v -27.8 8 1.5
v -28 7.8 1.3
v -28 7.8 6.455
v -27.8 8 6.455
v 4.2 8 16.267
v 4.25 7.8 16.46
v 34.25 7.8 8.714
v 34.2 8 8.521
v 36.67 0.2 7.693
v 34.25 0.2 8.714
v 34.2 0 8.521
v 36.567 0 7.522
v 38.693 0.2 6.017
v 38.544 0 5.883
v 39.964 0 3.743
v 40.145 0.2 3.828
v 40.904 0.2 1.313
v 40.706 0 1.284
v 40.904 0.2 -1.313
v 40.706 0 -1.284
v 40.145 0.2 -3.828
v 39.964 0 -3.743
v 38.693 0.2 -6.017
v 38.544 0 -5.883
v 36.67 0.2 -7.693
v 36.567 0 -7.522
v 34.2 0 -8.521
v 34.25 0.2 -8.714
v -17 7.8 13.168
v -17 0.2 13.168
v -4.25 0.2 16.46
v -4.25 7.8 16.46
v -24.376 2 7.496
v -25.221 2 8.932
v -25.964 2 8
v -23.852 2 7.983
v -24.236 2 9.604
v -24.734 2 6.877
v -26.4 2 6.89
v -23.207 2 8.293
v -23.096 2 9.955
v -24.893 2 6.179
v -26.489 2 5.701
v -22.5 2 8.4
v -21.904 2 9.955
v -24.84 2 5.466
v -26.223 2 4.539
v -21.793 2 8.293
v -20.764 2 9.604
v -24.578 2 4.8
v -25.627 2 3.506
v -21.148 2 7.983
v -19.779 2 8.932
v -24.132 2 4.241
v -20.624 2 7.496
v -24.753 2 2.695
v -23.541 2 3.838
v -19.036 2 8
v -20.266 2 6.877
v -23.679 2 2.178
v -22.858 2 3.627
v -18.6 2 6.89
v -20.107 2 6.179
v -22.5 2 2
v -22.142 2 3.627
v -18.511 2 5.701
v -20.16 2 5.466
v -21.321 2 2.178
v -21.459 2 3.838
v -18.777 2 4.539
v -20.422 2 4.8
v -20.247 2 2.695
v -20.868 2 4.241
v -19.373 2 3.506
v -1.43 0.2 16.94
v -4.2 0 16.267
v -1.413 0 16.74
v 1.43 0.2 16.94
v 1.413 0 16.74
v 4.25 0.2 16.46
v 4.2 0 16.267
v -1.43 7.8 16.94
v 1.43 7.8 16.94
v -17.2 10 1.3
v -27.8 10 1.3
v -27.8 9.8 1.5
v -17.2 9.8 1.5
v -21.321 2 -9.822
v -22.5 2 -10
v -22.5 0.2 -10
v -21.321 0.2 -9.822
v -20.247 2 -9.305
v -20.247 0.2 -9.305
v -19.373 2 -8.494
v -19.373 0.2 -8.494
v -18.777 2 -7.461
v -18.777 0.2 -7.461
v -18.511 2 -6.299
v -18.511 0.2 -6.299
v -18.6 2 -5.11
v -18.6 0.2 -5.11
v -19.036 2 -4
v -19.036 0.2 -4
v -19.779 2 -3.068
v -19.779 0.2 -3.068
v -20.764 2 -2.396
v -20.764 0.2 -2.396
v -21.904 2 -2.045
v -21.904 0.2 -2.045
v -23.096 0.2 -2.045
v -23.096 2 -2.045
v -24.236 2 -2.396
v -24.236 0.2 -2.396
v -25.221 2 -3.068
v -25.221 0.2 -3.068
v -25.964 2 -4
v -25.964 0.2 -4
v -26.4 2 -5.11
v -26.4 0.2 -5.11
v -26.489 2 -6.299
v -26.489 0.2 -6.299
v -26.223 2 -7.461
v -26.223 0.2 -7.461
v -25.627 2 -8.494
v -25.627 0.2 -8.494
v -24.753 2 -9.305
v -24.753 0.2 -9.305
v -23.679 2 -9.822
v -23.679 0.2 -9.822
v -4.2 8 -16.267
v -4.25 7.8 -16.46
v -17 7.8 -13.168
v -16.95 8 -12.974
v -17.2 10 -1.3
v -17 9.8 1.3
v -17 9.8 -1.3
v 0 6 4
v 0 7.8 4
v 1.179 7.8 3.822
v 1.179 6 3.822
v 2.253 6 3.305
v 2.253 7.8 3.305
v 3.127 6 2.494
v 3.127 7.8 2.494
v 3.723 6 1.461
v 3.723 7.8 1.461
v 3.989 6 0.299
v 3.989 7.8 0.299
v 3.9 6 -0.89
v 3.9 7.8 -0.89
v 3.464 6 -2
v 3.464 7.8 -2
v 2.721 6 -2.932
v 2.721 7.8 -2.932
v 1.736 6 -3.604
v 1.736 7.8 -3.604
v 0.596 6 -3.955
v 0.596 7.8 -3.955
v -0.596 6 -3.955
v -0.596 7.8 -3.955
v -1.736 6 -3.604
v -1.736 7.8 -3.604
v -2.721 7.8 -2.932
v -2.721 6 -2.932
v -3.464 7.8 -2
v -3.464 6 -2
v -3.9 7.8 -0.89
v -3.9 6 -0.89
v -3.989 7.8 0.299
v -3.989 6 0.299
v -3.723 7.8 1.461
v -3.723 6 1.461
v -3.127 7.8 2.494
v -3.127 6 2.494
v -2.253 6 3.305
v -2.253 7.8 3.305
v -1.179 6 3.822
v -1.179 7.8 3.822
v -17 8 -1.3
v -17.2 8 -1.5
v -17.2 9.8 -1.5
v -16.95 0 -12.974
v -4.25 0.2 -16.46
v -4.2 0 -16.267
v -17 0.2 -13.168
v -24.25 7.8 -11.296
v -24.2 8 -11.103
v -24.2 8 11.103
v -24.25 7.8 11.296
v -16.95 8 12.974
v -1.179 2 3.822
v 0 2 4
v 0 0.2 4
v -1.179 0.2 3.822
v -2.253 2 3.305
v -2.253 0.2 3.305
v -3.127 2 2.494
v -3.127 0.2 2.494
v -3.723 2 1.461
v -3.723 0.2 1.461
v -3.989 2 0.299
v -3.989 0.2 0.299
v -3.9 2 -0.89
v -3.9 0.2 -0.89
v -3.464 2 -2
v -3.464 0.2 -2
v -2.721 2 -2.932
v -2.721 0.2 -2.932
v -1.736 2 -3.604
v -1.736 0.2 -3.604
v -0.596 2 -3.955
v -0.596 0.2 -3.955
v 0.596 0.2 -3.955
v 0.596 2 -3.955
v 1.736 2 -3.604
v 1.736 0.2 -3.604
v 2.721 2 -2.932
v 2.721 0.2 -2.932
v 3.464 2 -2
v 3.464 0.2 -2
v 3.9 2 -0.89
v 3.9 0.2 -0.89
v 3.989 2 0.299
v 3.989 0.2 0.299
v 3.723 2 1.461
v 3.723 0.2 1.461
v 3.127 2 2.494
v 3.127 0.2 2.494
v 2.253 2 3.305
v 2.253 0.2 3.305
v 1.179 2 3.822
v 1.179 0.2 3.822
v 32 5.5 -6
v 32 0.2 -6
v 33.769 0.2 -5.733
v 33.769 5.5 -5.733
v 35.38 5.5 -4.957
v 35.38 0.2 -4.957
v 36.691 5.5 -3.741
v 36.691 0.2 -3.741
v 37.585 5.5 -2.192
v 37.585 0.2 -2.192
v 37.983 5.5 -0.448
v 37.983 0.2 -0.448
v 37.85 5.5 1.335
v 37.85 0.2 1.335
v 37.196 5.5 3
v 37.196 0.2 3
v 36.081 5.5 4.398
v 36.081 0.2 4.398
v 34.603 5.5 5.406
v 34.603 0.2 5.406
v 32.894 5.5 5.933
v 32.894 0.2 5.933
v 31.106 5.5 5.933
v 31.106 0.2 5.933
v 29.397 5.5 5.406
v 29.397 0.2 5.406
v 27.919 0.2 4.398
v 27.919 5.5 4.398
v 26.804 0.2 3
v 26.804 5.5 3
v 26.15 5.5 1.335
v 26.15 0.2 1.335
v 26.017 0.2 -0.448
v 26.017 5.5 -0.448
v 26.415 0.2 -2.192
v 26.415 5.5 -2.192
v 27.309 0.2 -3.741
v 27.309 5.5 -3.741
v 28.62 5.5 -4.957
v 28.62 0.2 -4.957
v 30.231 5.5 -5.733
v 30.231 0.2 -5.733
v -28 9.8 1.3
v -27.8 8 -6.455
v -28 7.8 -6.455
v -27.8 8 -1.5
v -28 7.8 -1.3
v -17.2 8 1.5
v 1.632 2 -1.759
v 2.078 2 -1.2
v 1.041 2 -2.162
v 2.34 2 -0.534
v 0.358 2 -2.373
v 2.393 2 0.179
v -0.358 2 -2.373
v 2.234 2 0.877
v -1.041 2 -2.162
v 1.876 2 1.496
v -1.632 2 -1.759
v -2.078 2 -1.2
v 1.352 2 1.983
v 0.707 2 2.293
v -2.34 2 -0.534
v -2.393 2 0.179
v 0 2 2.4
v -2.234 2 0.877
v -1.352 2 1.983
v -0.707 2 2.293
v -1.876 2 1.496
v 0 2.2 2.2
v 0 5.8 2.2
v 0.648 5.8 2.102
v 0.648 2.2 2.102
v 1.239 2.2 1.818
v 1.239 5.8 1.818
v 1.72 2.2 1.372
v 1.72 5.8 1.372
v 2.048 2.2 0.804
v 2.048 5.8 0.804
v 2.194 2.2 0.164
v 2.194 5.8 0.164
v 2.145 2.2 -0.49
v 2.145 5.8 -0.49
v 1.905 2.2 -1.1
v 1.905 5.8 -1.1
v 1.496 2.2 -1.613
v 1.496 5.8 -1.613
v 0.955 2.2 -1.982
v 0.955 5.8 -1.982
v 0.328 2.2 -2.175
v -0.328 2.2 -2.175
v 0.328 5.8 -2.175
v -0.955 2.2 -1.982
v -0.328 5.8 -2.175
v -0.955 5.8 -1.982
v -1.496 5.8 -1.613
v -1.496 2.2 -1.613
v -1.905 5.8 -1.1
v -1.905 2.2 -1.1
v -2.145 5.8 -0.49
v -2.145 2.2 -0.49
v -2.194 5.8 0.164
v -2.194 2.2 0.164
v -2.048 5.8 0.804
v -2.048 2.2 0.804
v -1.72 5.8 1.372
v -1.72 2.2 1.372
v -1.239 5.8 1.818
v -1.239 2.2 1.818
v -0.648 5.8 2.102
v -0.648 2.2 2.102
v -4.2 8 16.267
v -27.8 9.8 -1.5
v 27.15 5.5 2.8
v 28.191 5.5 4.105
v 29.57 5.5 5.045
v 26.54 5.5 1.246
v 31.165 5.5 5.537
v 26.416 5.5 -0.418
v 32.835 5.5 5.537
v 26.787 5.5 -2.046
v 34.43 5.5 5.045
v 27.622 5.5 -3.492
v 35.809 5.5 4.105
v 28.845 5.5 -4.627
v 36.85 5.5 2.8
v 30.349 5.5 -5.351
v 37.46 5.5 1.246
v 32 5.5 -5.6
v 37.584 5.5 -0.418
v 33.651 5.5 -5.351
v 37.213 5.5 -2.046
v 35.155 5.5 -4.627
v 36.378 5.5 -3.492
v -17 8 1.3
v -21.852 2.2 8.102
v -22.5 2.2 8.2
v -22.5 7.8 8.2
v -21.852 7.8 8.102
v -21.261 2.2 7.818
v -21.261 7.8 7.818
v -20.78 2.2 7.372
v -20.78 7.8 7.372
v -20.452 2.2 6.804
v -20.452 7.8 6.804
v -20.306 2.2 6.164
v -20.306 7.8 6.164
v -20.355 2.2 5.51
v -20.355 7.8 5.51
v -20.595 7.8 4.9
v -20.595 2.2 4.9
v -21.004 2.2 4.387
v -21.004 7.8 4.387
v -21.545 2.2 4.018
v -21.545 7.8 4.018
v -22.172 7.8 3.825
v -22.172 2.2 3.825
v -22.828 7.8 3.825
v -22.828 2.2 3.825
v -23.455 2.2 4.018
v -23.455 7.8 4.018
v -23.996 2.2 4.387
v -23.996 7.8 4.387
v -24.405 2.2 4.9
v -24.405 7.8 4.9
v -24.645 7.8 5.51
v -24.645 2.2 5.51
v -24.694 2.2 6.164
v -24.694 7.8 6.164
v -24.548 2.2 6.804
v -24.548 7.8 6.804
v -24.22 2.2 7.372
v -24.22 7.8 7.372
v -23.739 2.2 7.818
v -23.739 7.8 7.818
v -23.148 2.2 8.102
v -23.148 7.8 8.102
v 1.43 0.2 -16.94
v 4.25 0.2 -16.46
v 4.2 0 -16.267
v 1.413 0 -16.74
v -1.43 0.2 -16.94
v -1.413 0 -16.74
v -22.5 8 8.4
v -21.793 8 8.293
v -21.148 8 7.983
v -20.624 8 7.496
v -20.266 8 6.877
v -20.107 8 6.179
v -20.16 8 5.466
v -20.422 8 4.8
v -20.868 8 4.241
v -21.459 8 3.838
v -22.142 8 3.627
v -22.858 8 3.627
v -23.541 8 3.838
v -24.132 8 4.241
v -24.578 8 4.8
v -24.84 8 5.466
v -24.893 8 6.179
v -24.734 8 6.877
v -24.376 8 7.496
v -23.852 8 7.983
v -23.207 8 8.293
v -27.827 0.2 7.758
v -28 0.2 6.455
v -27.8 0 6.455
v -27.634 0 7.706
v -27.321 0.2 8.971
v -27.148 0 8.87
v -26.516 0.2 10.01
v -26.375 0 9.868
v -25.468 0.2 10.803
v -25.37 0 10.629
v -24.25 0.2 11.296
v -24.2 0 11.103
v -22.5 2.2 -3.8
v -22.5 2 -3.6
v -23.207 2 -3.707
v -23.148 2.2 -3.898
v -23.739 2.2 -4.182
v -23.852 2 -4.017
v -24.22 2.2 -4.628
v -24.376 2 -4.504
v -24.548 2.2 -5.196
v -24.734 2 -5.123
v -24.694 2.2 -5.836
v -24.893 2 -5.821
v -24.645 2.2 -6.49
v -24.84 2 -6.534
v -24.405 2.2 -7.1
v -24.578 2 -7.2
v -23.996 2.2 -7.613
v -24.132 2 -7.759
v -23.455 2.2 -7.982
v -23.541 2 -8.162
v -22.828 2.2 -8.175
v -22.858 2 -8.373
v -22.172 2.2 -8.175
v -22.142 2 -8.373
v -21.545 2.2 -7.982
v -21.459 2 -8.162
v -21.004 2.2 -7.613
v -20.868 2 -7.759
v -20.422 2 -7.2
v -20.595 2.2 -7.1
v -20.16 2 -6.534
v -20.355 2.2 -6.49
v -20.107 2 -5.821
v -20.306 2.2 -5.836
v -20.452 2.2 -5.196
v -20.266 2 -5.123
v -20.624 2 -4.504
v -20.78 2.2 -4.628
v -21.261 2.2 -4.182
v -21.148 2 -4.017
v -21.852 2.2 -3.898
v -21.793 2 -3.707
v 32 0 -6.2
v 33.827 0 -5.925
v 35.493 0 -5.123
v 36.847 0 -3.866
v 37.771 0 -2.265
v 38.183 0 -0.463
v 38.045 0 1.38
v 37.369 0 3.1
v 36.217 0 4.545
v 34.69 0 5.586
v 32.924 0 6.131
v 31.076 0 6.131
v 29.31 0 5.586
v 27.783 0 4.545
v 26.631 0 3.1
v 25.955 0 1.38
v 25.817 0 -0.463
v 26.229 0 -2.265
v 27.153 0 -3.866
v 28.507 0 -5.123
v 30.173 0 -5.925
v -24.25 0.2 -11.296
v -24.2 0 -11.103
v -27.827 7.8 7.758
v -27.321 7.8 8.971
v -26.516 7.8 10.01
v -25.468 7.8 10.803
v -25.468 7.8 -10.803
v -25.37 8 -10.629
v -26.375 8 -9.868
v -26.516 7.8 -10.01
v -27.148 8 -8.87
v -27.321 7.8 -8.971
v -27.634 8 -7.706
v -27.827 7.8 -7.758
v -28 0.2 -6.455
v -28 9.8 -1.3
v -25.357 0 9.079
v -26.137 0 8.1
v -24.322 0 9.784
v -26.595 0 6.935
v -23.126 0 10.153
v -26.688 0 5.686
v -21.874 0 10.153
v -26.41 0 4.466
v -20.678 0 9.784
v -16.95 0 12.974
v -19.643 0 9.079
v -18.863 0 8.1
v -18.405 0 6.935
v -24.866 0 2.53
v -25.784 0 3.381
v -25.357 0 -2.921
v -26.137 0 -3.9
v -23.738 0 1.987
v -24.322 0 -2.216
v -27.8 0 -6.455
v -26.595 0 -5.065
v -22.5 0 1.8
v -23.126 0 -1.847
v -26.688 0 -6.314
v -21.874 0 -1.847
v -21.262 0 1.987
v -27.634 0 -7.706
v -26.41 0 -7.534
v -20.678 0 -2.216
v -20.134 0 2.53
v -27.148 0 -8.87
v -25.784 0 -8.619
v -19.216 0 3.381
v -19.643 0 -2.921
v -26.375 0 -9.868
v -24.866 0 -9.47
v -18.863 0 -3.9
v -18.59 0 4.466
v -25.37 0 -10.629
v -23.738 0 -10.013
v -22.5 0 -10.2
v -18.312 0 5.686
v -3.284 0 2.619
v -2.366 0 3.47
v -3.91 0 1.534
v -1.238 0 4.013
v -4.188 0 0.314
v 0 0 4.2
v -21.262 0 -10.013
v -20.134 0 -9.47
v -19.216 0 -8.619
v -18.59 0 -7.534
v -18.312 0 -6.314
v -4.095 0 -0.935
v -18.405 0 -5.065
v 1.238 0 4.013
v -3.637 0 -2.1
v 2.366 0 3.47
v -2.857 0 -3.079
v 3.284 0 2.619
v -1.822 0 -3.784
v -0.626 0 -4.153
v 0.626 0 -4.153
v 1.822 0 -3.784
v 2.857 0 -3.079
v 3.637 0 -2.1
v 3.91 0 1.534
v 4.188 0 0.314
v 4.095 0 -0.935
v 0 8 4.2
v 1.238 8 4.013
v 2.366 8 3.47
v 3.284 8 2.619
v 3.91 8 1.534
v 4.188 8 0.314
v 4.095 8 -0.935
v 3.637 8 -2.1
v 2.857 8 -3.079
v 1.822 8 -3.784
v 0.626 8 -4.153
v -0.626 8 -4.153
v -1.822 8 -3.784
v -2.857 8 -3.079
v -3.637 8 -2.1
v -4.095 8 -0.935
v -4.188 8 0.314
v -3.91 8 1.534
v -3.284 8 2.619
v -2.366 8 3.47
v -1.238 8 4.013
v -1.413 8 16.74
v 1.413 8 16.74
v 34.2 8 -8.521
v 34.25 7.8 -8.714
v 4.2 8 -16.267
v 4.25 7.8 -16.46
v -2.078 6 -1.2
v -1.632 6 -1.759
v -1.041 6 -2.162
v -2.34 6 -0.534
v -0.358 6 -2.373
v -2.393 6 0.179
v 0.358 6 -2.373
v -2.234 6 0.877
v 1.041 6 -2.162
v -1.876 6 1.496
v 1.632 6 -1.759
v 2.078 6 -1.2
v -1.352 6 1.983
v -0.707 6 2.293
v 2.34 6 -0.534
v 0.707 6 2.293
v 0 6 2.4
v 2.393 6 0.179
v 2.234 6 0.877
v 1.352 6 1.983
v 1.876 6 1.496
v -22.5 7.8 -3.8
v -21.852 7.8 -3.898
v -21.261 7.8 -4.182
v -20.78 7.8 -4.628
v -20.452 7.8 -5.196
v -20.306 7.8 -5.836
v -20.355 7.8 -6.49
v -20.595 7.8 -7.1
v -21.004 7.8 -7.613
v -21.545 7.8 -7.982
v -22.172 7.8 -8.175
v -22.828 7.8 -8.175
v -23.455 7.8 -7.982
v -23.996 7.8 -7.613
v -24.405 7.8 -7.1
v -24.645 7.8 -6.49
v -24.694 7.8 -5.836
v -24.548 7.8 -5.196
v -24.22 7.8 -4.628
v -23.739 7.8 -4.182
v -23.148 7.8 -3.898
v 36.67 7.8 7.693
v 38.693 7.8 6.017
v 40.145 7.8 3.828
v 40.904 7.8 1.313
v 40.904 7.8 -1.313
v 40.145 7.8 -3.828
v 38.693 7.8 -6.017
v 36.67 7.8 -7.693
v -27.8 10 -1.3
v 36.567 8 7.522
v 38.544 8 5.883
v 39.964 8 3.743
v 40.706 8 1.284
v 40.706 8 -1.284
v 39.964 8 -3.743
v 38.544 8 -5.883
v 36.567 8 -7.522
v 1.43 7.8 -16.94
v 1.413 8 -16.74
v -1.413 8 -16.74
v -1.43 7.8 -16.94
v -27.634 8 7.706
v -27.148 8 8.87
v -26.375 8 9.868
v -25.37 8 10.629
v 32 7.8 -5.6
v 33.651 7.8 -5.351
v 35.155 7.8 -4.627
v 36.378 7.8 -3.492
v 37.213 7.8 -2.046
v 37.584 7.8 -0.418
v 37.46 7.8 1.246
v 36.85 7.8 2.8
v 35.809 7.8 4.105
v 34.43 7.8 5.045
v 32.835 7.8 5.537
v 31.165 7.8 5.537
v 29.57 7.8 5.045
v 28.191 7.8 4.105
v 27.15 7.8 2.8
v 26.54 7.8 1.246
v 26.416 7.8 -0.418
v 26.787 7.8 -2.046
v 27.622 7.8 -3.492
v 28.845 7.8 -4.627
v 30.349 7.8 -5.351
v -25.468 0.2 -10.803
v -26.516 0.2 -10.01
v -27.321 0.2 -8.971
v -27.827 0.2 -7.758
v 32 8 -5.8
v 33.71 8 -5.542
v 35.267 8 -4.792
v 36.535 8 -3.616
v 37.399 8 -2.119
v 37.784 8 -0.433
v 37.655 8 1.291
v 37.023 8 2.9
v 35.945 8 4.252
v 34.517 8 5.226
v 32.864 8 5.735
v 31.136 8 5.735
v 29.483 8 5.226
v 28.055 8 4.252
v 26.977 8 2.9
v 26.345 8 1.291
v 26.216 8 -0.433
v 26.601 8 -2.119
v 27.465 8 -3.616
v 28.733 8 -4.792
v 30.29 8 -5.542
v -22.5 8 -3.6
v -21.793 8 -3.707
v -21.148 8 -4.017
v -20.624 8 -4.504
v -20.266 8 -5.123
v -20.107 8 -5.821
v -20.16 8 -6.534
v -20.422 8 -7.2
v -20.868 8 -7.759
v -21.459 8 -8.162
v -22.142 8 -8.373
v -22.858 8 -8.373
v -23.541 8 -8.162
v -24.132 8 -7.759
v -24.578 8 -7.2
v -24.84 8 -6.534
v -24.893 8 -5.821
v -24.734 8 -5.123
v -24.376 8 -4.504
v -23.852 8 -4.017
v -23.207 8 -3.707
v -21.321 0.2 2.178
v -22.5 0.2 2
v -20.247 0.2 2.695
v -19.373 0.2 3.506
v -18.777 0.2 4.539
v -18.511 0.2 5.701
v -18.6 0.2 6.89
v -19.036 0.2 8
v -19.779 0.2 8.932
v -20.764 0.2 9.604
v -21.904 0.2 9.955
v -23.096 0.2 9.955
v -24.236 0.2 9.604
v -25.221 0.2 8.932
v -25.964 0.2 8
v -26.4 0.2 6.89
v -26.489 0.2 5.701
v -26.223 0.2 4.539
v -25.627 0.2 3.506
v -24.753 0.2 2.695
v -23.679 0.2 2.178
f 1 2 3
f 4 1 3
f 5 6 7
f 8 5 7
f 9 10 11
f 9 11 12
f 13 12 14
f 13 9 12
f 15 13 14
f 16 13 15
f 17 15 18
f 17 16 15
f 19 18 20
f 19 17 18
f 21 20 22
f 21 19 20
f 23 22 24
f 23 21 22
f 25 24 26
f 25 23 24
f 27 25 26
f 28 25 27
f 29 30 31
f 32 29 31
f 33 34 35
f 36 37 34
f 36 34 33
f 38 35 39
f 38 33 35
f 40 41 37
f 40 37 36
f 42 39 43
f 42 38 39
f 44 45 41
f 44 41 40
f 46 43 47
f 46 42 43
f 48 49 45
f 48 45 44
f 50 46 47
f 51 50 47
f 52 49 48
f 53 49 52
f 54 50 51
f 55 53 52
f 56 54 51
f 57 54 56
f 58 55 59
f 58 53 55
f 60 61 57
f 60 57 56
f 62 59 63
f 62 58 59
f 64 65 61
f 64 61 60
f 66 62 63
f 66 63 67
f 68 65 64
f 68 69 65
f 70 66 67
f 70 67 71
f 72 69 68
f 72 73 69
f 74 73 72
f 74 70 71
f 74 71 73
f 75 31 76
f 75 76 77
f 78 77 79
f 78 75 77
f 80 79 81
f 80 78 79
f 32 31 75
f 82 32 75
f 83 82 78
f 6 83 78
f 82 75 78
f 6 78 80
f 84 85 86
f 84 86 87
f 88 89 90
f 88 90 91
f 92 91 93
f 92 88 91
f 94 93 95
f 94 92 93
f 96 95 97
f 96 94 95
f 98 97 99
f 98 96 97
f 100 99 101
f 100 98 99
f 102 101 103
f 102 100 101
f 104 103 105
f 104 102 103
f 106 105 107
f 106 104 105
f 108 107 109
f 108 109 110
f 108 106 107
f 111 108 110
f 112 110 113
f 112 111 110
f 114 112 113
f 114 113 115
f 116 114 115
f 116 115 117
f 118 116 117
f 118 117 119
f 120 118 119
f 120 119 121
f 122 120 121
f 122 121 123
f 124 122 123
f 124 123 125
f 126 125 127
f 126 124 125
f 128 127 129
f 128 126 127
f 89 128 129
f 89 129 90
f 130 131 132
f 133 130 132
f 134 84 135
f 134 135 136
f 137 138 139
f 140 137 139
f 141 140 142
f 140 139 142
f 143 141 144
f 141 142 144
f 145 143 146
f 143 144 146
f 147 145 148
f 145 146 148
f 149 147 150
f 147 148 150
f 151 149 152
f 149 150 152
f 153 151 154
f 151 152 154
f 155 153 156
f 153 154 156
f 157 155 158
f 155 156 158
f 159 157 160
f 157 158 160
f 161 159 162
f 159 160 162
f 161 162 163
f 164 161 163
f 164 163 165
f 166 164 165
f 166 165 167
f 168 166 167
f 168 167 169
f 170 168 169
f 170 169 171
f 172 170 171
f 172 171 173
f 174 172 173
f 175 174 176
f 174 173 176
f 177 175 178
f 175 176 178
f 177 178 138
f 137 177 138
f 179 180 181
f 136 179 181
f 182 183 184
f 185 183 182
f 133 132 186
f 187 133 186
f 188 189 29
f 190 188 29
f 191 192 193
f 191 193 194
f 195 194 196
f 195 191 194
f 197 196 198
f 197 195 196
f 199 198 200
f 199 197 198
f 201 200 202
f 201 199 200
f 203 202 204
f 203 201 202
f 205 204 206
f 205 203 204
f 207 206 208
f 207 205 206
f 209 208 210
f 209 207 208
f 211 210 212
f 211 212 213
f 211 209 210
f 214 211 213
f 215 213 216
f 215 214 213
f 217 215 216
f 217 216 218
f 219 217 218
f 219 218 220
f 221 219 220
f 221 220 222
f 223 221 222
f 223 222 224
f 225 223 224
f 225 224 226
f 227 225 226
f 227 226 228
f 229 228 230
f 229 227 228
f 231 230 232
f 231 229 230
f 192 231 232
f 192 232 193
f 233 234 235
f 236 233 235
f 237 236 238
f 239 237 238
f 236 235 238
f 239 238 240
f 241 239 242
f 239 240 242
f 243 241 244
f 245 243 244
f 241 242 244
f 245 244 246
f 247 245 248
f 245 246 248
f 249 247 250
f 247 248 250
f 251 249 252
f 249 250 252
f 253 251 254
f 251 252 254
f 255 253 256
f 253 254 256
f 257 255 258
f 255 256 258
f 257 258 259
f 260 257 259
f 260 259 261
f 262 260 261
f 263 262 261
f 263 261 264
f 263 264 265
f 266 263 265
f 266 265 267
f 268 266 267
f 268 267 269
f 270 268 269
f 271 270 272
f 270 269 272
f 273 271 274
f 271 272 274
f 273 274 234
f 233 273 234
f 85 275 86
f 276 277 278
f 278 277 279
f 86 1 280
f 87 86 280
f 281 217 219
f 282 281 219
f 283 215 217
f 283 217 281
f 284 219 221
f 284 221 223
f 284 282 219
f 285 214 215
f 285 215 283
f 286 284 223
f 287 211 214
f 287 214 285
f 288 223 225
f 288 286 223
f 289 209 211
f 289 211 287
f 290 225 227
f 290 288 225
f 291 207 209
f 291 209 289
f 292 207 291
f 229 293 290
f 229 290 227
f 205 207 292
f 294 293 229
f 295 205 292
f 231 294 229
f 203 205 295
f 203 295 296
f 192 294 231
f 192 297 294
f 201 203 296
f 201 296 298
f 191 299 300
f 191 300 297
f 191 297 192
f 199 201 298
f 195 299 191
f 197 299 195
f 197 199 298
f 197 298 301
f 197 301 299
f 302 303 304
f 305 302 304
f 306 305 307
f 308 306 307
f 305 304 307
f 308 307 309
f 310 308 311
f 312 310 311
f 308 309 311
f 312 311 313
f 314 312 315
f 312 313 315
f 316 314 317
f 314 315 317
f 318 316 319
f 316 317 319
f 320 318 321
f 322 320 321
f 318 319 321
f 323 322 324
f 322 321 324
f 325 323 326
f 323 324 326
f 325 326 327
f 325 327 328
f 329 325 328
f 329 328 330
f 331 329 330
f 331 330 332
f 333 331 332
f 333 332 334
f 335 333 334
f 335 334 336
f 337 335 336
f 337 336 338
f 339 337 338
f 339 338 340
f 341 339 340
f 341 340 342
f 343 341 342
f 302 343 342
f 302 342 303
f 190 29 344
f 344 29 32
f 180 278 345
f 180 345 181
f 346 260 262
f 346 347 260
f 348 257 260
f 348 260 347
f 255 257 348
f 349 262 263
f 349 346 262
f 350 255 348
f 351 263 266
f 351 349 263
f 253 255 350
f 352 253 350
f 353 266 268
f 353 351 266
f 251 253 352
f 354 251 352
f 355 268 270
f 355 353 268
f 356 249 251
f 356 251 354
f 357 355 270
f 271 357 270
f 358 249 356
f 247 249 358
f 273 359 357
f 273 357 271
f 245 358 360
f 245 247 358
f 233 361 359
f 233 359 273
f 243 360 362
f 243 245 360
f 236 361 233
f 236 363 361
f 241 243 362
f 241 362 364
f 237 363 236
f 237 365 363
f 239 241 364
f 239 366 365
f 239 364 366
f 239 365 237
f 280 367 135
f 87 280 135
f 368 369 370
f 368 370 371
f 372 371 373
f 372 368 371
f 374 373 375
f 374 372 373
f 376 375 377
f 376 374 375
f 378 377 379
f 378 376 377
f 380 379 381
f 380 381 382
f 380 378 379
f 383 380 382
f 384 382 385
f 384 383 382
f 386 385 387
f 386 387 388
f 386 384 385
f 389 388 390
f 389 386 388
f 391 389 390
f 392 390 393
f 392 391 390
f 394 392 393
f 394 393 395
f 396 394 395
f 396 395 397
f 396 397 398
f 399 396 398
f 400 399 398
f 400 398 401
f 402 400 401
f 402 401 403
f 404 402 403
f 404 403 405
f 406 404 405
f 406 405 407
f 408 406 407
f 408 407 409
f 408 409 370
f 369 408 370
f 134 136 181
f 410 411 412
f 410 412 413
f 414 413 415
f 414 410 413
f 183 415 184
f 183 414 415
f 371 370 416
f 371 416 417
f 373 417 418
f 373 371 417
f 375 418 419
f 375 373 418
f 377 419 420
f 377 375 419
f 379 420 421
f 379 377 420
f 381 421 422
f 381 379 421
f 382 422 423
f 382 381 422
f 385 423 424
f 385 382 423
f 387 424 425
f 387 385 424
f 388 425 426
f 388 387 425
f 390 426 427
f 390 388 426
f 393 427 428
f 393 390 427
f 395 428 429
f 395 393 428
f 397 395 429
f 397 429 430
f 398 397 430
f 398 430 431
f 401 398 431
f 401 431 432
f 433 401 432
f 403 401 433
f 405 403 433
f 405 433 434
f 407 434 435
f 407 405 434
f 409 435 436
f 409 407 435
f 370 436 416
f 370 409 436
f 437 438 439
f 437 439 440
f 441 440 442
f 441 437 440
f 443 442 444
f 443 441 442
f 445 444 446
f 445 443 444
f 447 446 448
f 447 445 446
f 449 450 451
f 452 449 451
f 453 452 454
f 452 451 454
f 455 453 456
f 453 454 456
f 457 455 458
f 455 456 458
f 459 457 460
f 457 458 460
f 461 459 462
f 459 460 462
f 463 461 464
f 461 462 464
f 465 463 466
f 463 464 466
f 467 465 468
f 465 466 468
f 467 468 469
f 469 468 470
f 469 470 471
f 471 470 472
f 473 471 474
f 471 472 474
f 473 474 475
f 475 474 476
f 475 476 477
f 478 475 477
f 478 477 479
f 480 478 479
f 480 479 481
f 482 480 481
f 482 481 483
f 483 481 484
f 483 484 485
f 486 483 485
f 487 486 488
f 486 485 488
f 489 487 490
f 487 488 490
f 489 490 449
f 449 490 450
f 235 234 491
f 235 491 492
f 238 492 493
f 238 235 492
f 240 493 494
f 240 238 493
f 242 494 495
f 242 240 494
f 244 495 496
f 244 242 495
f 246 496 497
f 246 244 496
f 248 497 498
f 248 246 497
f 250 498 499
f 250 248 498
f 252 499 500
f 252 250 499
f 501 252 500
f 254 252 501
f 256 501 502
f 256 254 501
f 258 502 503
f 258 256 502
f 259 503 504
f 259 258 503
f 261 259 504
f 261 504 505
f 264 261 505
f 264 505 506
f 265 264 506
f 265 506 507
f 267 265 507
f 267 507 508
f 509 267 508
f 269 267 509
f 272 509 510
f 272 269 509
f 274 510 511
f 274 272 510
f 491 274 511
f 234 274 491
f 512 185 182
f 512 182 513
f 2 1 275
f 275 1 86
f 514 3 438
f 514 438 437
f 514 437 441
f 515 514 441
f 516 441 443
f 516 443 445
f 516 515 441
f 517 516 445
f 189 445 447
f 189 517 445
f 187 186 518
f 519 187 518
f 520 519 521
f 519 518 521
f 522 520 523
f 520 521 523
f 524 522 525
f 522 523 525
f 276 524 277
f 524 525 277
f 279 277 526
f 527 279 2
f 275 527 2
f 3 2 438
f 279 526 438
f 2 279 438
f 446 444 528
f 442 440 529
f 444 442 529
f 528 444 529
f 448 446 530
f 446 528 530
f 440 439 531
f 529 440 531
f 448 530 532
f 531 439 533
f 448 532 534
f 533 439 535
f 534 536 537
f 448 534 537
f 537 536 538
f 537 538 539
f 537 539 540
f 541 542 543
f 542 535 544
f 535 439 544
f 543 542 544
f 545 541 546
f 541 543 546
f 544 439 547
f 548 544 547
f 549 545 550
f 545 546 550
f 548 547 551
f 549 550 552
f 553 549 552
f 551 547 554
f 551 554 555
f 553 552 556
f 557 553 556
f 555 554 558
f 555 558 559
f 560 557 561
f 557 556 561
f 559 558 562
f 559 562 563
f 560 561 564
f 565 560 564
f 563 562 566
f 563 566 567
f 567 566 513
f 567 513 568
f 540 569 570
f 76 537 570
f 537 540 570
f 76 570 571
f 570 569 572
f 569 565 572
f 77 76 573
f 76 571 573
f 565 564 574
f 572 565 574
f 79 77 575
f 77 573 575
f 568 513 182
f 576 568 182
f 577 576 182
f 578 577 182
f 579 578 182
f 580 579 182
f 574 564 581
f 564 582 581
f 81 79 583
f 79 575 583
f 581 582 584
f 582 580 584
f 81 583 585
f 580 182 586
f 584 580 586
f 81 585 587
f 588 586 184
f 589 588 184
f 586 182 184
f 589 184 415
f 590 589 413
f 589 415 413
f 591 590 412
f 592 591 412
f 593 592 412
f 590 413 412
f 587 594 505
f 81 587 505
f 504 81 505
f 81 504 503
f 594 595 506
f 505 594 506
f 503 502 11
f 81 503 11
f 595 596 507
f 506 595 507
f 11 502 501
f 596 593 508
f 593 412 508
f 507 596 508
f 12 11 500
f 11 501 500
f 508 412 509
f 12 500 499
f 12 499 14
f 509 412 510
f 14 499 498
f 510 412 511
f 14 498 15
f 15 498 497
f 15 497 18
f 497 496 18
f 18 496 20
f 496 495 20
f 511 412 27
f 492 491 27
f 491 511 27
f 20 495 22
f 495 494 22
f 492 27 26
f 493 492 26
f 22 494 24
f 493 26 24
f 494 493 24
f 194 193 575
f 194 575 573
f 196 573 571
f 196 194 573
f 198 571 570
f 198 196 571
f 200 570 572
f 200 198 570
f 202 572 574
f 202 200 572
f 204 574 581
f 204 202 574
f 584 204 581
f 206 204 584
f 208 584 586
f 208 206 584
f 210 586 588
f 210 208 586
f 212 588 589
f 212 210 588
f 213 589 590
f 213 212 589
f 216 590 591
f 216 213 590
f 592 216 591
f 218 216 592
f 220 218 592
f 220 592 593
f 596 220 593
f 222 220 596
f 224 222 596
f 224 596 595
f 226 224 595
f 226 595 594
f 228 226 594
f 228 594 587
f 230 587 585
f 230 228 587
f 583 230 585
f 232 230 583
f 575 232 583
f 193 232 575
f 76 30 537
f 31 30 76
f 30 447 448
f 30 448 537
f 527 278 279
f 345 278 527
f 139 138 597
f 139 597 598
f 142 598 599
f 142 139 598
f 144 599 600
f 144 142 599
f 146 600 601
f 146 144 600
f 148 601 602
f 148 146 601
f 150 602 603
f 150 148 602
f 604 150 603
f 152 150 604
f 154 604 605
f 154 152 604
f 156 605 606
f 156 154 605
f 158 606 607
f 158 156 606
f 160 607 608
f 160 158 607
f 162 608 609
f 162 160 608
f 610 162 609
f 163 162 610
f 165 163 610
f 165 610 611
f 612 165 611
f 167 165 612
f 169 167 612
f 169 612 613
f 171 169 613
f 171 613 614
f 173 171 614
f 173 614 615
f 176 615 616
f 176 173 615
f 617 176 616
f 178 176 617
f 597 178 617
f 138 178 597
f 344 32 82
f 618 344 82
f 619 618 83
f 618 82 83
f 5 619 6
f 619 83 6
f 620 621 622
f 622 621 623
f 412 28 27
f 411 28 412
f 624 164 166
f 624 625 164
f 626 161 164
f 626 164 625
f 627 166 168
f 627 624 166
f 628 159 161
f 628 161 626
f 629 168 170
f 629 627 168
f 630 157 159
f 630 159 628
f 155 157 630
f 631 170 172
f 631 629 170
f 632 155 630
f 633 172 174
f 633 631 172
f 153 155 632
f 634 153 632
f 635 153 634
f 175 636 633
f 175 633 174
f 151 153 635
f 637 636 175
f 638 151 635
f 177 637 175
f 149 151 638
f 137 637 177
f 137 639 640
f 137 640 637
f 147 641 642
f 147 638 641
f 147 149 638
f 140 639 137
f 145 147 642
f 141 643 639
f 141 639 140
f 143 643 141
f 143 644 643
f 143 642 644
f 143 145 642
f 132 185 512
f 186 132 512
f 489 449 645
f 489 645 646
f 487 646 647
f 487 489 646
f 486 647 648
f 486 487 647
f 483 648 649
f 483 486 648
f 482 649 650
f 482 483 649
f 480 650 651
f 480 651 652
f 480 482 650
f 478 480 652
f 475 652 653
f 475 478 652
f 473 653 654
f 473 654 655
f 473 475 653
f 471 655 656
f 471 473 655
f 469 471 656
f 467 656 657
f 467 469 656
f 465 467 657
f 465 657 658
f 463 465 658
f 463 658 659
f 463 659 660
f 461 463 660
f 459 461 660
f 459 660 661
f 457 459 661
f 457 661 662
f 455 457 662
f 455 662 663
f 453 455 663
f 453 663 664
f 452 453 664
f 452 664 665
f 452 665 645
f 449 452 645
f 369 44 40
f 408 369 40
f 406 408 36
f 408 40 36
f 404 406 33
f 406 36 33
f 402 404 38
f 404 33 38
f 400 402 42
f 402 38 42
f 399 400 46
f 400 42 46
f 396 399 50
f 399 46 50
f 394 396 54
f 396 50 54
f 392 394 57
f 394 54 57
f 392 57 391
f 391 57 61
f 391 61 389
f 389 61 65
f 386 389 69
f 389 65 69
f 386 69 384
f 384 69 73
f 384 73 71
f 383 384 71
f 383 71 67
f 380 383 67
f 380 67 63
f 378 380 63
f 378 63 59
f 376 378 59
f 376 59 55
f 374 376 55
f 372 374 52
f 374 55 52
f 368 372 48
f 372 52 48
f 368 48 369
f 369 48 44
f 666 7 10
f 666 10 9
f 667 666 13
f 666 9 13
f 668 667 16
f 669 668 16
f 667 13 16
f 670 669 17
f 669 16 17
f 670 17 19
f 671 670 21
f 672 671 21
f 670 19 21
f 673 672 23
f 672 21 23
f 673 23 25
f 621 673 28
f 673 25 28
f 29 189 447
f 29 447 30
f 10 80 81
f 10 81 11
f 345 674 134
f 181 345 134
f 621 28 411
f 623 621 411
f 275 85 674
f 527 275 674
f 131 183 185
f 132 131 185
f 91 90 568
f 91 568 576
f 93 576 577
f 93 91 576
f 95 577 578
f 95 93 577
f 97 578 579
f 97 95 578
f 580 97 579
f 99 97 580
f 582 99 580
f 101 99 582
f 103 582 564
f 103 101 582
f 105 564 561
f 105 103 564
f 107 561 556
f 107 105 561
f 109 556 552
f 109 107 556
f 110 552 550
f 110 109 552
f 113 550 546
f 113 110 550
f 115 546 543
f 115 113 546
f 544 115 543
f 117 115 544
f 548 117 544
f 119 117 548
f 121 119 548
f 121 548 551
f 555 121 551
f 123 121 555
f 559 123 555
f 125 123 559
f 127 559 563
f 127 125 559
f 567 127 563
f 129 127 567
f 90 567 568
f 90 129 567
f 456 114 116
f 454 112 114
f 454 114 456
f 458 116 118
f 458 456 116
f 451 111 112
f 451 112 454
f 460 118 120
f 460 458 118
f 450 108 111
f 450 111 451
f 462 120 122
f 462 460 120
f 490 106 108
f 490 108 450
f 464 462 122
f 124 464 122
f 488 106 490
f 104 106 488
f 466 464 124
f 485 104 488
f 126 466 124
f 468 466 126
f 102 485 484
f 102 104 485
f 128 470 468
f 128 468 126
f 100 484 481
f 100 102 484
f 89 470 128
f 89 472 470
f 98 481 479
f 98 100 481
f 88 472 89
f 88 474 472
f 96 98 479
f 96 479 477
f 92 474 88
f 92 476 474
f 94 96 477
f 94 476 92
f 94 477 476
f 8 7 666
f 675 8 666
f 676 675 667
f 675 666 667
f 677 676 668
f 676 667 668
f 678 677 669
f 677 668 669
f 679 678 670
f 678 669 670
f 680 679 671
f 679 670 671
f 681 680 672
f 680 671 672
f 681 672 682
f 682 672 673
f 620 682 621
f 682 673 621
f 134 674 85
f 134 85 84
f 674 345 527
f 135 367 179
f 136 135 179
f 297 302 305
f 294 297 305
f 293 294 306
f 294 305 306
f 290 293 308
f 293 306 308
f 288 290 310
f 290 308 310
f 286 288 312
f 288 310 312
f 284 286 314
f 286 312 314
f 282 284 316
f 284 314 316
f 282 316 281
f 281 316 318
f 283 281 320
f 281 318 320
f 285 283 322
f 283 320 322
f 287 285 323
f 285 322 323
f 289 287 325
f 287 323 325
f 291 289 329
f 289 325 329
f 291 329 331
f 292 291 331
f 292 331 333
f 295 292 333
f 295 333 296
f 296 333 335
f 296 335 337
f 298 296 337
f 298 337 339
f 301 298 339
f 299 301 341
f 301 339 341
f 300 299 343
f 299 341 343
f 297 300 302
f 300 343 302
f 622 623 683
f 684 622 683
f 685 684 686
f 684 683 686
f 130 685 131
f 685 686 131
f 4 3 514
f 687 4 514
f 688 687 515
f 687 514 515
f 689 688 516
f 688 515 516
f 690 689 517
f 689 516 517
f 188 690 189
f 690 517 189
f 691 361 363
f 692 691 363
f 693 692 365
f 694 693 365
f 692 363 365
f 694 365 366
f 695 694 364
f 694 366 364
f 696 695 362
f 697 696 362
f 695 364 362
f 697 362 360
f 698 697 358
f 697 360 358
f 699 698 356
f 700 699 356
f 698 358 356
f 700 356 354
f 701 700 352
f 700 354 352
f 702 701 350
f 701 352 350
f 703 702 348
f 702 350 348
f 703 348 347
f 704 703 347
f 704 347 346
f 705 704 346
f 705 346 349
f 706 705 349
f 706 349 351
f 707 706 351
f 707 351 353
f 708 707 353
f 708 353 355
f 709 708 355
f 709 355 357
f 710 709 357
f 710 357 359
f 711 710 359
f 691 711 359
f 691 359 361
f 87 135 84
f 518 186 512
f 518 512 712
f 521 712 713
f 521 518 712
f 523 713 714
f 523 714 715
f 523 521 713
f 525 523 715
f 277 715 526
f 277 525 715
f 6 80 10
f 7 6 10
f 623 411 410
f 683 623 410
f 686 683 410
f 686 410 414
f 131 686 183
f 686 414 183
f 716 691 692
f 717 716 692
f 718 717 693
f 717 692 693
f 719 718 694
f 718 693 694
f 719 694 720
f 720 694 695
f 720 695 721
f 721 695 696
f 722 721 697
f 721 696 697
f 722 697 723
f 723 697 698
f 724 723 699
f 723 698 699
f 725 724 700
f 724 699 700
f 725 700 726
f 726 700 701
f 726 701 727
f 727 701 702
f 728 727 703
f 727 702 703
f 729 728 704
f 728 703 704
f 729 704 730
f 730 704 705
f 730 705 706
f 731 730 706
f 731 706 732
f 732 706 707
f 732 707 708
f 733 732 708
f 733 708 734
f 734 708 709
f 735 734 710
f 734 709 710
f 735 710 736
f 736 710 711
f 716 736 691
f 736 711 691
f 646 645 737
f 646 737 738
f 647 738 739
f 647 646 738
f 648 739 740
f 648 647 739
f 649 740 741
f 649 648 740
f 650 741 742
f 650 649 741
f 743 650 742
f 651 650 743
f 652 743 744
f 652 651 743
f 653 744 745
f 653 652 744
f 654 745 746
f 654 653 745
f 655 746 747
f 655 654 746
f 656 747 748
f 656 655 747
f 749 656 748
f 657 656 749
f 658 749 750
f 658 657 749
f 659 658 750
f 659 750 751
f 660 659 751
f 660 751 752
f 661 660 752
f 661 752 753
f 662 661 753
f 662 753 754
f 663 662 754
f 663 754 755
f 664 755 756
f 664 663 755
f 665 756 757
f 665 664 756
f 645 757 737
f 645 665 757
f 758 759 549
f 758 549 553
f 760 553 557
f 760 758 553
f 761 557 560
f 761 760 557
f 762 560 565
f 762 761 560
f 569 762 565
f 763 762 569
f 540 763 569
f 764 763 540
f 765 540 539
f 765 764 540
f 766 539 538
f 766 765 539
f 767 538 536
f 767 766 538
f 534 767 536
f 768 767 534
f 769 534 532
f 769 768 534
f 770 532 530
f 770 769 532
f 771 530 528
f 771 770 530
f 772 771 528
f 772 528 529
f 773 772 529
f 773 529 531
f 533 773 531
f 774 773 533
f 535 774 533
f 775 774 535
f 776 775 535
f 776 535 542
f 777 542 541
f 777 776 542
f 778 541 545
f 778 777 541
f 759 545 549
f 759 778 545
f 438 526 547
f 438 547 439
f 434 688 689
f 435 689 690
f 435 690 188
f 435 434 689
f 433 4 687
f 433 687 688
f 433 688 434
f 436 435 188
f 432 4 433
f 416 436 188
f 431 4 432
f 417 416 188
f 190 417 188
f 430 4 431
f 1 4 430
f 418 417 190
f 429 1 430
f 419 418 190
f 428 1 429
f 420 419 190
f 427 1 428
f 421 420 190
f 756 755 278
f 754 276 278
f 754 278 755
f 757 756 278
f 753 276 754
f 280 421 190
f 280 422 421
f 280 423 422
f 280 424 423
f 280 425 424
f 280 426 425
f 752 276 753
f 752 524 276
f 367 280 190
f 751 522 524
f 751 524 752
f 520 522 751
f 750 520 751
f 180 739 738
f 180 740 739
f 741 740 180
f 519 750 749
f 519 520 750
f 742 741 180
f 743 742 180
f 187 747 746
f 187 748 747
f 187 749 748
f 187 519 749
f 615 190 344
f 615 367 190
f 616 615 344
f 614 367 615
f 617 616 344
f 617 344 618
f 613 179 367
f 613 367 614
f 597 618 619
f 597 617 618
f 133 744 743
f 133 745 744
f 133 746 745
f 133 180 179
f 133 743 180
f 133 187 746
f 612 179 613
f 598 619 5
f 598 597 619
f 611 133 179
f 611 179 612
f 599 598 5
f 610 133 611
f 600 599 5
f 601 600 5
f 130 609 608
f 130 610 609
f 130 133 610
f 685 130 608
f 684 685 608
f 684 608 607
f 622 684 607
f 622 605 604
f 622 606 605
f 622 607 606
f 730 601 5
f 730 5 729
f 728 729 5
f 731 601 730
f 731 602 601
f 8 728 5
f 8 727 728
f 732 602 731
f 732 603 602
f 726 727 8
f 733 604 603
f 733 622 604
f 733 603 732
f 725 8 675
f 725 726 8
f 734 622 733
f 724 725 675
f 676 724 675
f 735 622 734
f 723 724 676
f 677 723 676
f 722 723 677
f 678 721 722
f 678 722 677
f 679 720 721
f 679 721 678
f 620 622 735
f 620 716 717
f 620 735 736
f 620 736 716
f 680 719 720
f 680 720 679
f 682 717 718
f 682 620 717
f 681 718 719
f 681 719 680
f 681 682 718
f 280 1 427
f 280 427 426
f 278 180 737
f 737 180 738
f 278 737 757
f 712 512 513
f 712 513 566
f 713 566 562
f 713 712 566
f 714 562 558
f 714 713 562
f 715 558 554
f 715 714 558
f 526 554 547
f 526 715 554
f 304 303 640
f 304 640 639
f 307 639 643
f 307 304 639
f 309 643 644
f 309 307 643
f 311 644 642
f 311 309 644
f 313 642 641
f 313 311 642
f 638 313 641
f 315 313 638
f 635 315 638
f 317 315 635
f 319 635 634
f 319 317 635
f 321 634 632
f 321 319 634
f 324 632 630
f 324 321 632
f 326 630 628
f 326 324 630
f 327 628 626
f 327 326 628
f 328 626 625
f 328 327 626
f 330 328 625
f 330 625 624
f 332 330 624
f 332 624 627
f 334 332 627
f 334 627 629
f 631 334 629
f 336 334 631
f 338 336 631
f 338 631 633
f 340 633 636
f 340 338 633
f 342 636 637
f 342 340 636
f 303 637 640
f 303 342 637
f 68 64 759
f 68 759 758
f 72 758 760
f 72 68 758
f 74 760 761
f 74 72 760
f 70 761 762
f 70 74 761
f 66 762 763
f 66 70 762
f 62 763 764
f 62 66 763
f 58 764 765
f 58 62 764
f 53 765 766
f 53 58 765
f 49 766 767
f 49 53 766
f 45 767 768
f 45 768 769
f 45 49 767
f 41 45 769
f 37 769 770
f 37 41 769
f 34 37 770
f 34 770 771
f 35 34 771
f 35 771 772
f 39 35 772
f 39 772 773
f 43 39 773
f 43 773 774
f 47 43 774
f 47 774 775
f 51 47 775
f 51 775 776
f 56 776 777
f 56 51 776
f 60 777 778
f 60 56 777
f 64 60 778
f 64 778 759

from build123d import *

# Parameters (mm, degrees)
SKETCH_1_R           = 2.1
EXTRUDE_2_DEPTH      = 8
SKETCH_2_R           = 2.2
CUT_EXTRUDE_1_DEPTH  = 20
SKETCH_2_3_R         = 4
SKETCH_2_3_R_2       = 2.2
CUT_EXTRUDE_2_DEPTH  = 2
CUT_EXTRUDE_START    = -8
SKETCH_9_R           = 3
SKETCH_9_R_2         = 2.1
CUT_EXTRUDE_11_DEPTH = 8
SKETCH_10_R          = 5.6
SKETCH_10_R_2        = 3
CUT_EXTRUDE_12_DEPTH = 5.5
SKETCH_10_3_R        = 6
SKETCH_10_3_R_2      = 5.6
CUT_EXTRUDE_13_DEPTH = 5.5
SKETCH_10_4_R        = 5.6
SKETCH_10_4_R_2      = 3
CUT_EXTRUDE_14_DEPTH = 20
CHAMFER_1_SIZE       = 0.2
SKETCH_11_R          = 2.2
EXTRUDE_3_DEPTH      = 8
FILLET_1_R           = 5
SKETCH_12_W          = 11
SKETCH_12_H          = 3
EXTRUDE_5_DEPTH      = 2
CUT_EXTRUDE_START_2  = -2
SKETCH_13_R          = 4
CUT_EXTRUDE_16_DEPTH = 2
CHAMFER_2_SIZE       = 0.2


with BuildPart() as part:
    # 스케치1 → 보스-돌출2 (new body)
    with BuildSketch(Plane(origin=(0, 0, 0), x_dir=(1, 0, 0), z_dir=(0, 1, 0))):
        with BuildLine():
            Line((34.25, 8.714212529), (4.25, 16.460179221))
            ThreePointArc((4.25, 16.460179221), (-17, 0), (4.25, -16.460179221))
            Line((4.25, -16.460179221), (34.25, -8.714212529))
            ThreePointArc((34.25, -8.714212529), (41, 0), (34.25, 8.714212529))
        make_face()
        with Locations(Location((32, 0, 0), (0, 0, 270))):
            Circle(SKETCH_1_R, mode=Mode.SUBTRACT)
    extrude(amount=EXTRUDE_2_DEPTH)

    # 스케치2 → 컷-돌출1 (cut)
    with BuildSketch(Plane(origin=(0, 8, 0), x_dir=(1, 0, 0), z_dir=(0, 1, 0))):
        with Locations(Location((0, 0, 0), (0, 0, 270))):
            Circle(SKETCH_2_R)
    extrude(amount=-CUT_EXTRUDE_1_DEPTH, mode=Mode.SUBTRACT)

    # 스케치2<3> → 컷-돌출2 (cut)
    with BuildSketch(Plane(origin=(0, 8, 0), x_dir=(1, 0, 0), z_dir=(0, 1, 0))):
        with Locations(Location((0, 0, 0), (0, 0, 270))):
            Circle(SKETCH_2_3_R)
        with Locations(Location((0, 0, 0), (0, 0, 270))):
            Circle(SKETCH_2_3_R_2, mode=Mode.SUBTRACT)
    extrude(amount=-CUT_EXTRUDE_2_DEPTH, mode=Mode.SUBTRACT)

    # 스케치9 → 컷-돌출11 (cut)
    with BuildSketch(Plane(origin=(0, 8, 0), x_dir=(1, 0, 0), z_dir=(0, 1, 0)).offset(CUT_EXTRUDE_START)):
        with Locations(Location((32, 0, 0), (0, 0, 270))):
            Circle(SKETCH_9_R)
        with Locations((32, 0)):
            Circle(SKETCH_9_R_2, mode=Mode.SUBTRACT)
    extrude(amount=CUT_EXTRUDE_11_DEPTH, mode=Mode.SUBTRACT)

    # 스케치10 → 컷-돌출12 (cut)
    with BuildSketch(Plane.XZ):
        with Locations(Location((32, 0, 0), (0, 0, 270))):
            Circle(SKETCH_10_R)
        with Locations(Location((32, 0, 0), (0, 0, 90))):
            Circle(SKETCH_10_R_2, mode=Mode.SUBTRACT)
    extrude(amount=-CUT_EXTRUDE_12_DEPTH, mode=Mode.SUBTRACT)

    # 스케치10<3> → 컷-돌출13 (cut)
    with BuildSketch(Plane.XZ):
        with Locations(Location((32, 0, 0), (0, 0, 270))):
            Circle(SKETCH_10_3_R)
        with Locations((32, 0)):
            Circle(SKETCH_10_3_R_2, mode=Mode.SUBTRACT)
    extrude(amount=-CUT_EXTRUDE_13_DEPTH, mode=Mode.SUBTRACT)

    # 스케치10<4> → 컷-돌출14 (cut)
    with BuildSketch(Plane.XZ):
        with Locations(Location((32, 0, 0), (0, 0, 270))):
            Circle(SKETCH_10_4_R)
        with Locations((32, 0)):
            Circle(SKETCH_10_4_R_2, mode=Mode.SUBTRACT)
    extrude(amount=-CUT_EXTRUDE_14_DEPTH, mode=Mode.SUBTRACT)

    # 모따기1
    chamfer_1_edges = [part.edges().sort_by_distance(p)[0] for p in [
        (32, 0, 6),
        (32, 8, 5.6),
    ]]
    chamfer(chamfer_1_edges, length=CHAMFER_1_SIZE)

    # 스케치11 → 보스-돌출3 (add)
    # profile 1 of 3: a face of its own
    with BuildSketch(Plane(origin=(0, 0, 0), x_dir=(1, 0, 0), z_dir=(0, 1, 0))):
        with BuildLine():
            ThreePointArc((-17, 1.7e-08), (-13.43968005, 10.410331414), (-4.25, 16.460179221))
            Line((-4.25, 16.460179221), (-17, 13.168143377))
            Line((-17, 13.168143377), (-17, 1.7e-08))
        make_face()
    # profile 2 of 3: a face of its own
    with BuildSketch(Plane(origin=(0, 0, 0), x_dir=(1, 0, 0), z_dir=(0, 1, 0))):
        with BuildLine():
            ThreePointArc((-4.25, -16.460179221), (-13.439680061, -10.4103314), (-17, 1.7e-08))
            Line((-17, 1.7e-08), (-17, -13.168143377))
            Line((-17, -13.168143377), (-4.25, -16.460179221))
        make_face()
    # profile 3 of 3: a face of its own
    with BuildSketch(Plane(origin=(0, 0, 0), x_dir=(1, 0, 0), z_dir=(0, 1, 0))):
        Polygon((-17, 1.7e-08), (-17, 13.168143377), (-28, 10.32795559), (-28, -10.32795559), (-17, -13.168143377), align=None)
        with Locations(Location((-22.5, -6, 0), (0, 0, 270))):
            Circle(SKETCH_11_R, mode=Mode.SUBTRACT)
        with Locations(Location((-22.5, 6, 0), (0, 0, 270))):
            Circle(SKETCH_11_R, mode=Mode.SUBTRACT)
    extrude(amount=EXTRUDE_3_DEPTH)

    # 필렛1
    fillet_1_edges = [part.edges().sort_by_distance(p)[0] for p in [
        (-28, 4, 10.32795559),
        (-28, 4, -10.32795559),
    ]]
    fillet(fillet_1_edges, radius=FILLET_1_R)

    # 스케치12 → 보스-돌출5 (add)
    with BuildSketch(Plane(origin=(0, 8, 0), x_dir=(1, 0, 0), z_dir=(0, 1, 0))):
        with Locations((-22.5, 0)):
            Rectangle(SKETCH_12_W, SKETCH_12_H)
    extrude(amount=EXTRUDE_5_DEPTH)

    # 스케치13 → 컷-돌출16 (cut)
    with BuildSketch(Plane.XZ.offset(CUT_EXTRUDE_START_2)):
        with Locations(Location((-22.5, 6, 0), (0, 0, 270))):
            Circle(SKETCH_13_R)
        with Locations(Location((-22.5, -6, 0), (0, 0, 270))):
            Circle(SKETCH_13_R)
        with Locations(Location((0, 0, 0), (0, 0, 90))):
            Circle(SKETCH_13_R)
    extrude(amount=CUT_EXTRUDE_16_DEPTH, mode=Mode.SUBTRACT)

    # 모따기2
    chamfer_2_edges = [part.edges().sort_by_distance(p)[0] for p in [
        (-28, 8, -3.977486122),
        (-26.952847075, 8, -9.516834422),
        (-26.952847075, 8, 9.516834422),
        (19.25, 8, -12.587195875),
        (-28, 8, 3.977486122),
        (-17, 9, 1.5),
        (-17, 9, -1.5),
        (-28, 9, -1.5),
        (-28, 9, 1.5),
        (-17, 10, 0),
        (-22.5, 10, -1.5),
        (-28, 10, 0),
        (-22.5, 10, 1.5),
        (0, 0, -4),
        (0, 2, -2.2),
        (-22.5, 2, -8.2),
        (-22.5, 0, -2),
        (-22.5, 2, 3.8),
        (-22.5, 0, 10),
        (0, 8, -17),
        (19.25, 8, 12.587195875),
        (0, 6, -2.2),
        (0, 8, -4),
        (41, 8, 0),
        (19.25, 0, 12.587195875),
        (0, 0, -17),
        (0, 0, 17),
        (0, 8, 17),
        (-22.5, 8, 3.8),
        (-14.25, 0, -13.878190324),
        (19.25, 0, -12.587195875),
        (-22.5, 8, -8.2),
        (-14.25, 8, -13.878190324),
        (41, 0, 0),
        (-14.25, 8, 13.878190324),
        (-14.25, 0, 13.878190324),
        (-28, 0, 0),
        (-26.952847075, 0, -9.516834422),
        (-26.952847075, 0, 9.516834422),
    ]]
    chamfer(chamfer_2_edges, length=CHAMFER_2_SIZE)


solid = part.part
